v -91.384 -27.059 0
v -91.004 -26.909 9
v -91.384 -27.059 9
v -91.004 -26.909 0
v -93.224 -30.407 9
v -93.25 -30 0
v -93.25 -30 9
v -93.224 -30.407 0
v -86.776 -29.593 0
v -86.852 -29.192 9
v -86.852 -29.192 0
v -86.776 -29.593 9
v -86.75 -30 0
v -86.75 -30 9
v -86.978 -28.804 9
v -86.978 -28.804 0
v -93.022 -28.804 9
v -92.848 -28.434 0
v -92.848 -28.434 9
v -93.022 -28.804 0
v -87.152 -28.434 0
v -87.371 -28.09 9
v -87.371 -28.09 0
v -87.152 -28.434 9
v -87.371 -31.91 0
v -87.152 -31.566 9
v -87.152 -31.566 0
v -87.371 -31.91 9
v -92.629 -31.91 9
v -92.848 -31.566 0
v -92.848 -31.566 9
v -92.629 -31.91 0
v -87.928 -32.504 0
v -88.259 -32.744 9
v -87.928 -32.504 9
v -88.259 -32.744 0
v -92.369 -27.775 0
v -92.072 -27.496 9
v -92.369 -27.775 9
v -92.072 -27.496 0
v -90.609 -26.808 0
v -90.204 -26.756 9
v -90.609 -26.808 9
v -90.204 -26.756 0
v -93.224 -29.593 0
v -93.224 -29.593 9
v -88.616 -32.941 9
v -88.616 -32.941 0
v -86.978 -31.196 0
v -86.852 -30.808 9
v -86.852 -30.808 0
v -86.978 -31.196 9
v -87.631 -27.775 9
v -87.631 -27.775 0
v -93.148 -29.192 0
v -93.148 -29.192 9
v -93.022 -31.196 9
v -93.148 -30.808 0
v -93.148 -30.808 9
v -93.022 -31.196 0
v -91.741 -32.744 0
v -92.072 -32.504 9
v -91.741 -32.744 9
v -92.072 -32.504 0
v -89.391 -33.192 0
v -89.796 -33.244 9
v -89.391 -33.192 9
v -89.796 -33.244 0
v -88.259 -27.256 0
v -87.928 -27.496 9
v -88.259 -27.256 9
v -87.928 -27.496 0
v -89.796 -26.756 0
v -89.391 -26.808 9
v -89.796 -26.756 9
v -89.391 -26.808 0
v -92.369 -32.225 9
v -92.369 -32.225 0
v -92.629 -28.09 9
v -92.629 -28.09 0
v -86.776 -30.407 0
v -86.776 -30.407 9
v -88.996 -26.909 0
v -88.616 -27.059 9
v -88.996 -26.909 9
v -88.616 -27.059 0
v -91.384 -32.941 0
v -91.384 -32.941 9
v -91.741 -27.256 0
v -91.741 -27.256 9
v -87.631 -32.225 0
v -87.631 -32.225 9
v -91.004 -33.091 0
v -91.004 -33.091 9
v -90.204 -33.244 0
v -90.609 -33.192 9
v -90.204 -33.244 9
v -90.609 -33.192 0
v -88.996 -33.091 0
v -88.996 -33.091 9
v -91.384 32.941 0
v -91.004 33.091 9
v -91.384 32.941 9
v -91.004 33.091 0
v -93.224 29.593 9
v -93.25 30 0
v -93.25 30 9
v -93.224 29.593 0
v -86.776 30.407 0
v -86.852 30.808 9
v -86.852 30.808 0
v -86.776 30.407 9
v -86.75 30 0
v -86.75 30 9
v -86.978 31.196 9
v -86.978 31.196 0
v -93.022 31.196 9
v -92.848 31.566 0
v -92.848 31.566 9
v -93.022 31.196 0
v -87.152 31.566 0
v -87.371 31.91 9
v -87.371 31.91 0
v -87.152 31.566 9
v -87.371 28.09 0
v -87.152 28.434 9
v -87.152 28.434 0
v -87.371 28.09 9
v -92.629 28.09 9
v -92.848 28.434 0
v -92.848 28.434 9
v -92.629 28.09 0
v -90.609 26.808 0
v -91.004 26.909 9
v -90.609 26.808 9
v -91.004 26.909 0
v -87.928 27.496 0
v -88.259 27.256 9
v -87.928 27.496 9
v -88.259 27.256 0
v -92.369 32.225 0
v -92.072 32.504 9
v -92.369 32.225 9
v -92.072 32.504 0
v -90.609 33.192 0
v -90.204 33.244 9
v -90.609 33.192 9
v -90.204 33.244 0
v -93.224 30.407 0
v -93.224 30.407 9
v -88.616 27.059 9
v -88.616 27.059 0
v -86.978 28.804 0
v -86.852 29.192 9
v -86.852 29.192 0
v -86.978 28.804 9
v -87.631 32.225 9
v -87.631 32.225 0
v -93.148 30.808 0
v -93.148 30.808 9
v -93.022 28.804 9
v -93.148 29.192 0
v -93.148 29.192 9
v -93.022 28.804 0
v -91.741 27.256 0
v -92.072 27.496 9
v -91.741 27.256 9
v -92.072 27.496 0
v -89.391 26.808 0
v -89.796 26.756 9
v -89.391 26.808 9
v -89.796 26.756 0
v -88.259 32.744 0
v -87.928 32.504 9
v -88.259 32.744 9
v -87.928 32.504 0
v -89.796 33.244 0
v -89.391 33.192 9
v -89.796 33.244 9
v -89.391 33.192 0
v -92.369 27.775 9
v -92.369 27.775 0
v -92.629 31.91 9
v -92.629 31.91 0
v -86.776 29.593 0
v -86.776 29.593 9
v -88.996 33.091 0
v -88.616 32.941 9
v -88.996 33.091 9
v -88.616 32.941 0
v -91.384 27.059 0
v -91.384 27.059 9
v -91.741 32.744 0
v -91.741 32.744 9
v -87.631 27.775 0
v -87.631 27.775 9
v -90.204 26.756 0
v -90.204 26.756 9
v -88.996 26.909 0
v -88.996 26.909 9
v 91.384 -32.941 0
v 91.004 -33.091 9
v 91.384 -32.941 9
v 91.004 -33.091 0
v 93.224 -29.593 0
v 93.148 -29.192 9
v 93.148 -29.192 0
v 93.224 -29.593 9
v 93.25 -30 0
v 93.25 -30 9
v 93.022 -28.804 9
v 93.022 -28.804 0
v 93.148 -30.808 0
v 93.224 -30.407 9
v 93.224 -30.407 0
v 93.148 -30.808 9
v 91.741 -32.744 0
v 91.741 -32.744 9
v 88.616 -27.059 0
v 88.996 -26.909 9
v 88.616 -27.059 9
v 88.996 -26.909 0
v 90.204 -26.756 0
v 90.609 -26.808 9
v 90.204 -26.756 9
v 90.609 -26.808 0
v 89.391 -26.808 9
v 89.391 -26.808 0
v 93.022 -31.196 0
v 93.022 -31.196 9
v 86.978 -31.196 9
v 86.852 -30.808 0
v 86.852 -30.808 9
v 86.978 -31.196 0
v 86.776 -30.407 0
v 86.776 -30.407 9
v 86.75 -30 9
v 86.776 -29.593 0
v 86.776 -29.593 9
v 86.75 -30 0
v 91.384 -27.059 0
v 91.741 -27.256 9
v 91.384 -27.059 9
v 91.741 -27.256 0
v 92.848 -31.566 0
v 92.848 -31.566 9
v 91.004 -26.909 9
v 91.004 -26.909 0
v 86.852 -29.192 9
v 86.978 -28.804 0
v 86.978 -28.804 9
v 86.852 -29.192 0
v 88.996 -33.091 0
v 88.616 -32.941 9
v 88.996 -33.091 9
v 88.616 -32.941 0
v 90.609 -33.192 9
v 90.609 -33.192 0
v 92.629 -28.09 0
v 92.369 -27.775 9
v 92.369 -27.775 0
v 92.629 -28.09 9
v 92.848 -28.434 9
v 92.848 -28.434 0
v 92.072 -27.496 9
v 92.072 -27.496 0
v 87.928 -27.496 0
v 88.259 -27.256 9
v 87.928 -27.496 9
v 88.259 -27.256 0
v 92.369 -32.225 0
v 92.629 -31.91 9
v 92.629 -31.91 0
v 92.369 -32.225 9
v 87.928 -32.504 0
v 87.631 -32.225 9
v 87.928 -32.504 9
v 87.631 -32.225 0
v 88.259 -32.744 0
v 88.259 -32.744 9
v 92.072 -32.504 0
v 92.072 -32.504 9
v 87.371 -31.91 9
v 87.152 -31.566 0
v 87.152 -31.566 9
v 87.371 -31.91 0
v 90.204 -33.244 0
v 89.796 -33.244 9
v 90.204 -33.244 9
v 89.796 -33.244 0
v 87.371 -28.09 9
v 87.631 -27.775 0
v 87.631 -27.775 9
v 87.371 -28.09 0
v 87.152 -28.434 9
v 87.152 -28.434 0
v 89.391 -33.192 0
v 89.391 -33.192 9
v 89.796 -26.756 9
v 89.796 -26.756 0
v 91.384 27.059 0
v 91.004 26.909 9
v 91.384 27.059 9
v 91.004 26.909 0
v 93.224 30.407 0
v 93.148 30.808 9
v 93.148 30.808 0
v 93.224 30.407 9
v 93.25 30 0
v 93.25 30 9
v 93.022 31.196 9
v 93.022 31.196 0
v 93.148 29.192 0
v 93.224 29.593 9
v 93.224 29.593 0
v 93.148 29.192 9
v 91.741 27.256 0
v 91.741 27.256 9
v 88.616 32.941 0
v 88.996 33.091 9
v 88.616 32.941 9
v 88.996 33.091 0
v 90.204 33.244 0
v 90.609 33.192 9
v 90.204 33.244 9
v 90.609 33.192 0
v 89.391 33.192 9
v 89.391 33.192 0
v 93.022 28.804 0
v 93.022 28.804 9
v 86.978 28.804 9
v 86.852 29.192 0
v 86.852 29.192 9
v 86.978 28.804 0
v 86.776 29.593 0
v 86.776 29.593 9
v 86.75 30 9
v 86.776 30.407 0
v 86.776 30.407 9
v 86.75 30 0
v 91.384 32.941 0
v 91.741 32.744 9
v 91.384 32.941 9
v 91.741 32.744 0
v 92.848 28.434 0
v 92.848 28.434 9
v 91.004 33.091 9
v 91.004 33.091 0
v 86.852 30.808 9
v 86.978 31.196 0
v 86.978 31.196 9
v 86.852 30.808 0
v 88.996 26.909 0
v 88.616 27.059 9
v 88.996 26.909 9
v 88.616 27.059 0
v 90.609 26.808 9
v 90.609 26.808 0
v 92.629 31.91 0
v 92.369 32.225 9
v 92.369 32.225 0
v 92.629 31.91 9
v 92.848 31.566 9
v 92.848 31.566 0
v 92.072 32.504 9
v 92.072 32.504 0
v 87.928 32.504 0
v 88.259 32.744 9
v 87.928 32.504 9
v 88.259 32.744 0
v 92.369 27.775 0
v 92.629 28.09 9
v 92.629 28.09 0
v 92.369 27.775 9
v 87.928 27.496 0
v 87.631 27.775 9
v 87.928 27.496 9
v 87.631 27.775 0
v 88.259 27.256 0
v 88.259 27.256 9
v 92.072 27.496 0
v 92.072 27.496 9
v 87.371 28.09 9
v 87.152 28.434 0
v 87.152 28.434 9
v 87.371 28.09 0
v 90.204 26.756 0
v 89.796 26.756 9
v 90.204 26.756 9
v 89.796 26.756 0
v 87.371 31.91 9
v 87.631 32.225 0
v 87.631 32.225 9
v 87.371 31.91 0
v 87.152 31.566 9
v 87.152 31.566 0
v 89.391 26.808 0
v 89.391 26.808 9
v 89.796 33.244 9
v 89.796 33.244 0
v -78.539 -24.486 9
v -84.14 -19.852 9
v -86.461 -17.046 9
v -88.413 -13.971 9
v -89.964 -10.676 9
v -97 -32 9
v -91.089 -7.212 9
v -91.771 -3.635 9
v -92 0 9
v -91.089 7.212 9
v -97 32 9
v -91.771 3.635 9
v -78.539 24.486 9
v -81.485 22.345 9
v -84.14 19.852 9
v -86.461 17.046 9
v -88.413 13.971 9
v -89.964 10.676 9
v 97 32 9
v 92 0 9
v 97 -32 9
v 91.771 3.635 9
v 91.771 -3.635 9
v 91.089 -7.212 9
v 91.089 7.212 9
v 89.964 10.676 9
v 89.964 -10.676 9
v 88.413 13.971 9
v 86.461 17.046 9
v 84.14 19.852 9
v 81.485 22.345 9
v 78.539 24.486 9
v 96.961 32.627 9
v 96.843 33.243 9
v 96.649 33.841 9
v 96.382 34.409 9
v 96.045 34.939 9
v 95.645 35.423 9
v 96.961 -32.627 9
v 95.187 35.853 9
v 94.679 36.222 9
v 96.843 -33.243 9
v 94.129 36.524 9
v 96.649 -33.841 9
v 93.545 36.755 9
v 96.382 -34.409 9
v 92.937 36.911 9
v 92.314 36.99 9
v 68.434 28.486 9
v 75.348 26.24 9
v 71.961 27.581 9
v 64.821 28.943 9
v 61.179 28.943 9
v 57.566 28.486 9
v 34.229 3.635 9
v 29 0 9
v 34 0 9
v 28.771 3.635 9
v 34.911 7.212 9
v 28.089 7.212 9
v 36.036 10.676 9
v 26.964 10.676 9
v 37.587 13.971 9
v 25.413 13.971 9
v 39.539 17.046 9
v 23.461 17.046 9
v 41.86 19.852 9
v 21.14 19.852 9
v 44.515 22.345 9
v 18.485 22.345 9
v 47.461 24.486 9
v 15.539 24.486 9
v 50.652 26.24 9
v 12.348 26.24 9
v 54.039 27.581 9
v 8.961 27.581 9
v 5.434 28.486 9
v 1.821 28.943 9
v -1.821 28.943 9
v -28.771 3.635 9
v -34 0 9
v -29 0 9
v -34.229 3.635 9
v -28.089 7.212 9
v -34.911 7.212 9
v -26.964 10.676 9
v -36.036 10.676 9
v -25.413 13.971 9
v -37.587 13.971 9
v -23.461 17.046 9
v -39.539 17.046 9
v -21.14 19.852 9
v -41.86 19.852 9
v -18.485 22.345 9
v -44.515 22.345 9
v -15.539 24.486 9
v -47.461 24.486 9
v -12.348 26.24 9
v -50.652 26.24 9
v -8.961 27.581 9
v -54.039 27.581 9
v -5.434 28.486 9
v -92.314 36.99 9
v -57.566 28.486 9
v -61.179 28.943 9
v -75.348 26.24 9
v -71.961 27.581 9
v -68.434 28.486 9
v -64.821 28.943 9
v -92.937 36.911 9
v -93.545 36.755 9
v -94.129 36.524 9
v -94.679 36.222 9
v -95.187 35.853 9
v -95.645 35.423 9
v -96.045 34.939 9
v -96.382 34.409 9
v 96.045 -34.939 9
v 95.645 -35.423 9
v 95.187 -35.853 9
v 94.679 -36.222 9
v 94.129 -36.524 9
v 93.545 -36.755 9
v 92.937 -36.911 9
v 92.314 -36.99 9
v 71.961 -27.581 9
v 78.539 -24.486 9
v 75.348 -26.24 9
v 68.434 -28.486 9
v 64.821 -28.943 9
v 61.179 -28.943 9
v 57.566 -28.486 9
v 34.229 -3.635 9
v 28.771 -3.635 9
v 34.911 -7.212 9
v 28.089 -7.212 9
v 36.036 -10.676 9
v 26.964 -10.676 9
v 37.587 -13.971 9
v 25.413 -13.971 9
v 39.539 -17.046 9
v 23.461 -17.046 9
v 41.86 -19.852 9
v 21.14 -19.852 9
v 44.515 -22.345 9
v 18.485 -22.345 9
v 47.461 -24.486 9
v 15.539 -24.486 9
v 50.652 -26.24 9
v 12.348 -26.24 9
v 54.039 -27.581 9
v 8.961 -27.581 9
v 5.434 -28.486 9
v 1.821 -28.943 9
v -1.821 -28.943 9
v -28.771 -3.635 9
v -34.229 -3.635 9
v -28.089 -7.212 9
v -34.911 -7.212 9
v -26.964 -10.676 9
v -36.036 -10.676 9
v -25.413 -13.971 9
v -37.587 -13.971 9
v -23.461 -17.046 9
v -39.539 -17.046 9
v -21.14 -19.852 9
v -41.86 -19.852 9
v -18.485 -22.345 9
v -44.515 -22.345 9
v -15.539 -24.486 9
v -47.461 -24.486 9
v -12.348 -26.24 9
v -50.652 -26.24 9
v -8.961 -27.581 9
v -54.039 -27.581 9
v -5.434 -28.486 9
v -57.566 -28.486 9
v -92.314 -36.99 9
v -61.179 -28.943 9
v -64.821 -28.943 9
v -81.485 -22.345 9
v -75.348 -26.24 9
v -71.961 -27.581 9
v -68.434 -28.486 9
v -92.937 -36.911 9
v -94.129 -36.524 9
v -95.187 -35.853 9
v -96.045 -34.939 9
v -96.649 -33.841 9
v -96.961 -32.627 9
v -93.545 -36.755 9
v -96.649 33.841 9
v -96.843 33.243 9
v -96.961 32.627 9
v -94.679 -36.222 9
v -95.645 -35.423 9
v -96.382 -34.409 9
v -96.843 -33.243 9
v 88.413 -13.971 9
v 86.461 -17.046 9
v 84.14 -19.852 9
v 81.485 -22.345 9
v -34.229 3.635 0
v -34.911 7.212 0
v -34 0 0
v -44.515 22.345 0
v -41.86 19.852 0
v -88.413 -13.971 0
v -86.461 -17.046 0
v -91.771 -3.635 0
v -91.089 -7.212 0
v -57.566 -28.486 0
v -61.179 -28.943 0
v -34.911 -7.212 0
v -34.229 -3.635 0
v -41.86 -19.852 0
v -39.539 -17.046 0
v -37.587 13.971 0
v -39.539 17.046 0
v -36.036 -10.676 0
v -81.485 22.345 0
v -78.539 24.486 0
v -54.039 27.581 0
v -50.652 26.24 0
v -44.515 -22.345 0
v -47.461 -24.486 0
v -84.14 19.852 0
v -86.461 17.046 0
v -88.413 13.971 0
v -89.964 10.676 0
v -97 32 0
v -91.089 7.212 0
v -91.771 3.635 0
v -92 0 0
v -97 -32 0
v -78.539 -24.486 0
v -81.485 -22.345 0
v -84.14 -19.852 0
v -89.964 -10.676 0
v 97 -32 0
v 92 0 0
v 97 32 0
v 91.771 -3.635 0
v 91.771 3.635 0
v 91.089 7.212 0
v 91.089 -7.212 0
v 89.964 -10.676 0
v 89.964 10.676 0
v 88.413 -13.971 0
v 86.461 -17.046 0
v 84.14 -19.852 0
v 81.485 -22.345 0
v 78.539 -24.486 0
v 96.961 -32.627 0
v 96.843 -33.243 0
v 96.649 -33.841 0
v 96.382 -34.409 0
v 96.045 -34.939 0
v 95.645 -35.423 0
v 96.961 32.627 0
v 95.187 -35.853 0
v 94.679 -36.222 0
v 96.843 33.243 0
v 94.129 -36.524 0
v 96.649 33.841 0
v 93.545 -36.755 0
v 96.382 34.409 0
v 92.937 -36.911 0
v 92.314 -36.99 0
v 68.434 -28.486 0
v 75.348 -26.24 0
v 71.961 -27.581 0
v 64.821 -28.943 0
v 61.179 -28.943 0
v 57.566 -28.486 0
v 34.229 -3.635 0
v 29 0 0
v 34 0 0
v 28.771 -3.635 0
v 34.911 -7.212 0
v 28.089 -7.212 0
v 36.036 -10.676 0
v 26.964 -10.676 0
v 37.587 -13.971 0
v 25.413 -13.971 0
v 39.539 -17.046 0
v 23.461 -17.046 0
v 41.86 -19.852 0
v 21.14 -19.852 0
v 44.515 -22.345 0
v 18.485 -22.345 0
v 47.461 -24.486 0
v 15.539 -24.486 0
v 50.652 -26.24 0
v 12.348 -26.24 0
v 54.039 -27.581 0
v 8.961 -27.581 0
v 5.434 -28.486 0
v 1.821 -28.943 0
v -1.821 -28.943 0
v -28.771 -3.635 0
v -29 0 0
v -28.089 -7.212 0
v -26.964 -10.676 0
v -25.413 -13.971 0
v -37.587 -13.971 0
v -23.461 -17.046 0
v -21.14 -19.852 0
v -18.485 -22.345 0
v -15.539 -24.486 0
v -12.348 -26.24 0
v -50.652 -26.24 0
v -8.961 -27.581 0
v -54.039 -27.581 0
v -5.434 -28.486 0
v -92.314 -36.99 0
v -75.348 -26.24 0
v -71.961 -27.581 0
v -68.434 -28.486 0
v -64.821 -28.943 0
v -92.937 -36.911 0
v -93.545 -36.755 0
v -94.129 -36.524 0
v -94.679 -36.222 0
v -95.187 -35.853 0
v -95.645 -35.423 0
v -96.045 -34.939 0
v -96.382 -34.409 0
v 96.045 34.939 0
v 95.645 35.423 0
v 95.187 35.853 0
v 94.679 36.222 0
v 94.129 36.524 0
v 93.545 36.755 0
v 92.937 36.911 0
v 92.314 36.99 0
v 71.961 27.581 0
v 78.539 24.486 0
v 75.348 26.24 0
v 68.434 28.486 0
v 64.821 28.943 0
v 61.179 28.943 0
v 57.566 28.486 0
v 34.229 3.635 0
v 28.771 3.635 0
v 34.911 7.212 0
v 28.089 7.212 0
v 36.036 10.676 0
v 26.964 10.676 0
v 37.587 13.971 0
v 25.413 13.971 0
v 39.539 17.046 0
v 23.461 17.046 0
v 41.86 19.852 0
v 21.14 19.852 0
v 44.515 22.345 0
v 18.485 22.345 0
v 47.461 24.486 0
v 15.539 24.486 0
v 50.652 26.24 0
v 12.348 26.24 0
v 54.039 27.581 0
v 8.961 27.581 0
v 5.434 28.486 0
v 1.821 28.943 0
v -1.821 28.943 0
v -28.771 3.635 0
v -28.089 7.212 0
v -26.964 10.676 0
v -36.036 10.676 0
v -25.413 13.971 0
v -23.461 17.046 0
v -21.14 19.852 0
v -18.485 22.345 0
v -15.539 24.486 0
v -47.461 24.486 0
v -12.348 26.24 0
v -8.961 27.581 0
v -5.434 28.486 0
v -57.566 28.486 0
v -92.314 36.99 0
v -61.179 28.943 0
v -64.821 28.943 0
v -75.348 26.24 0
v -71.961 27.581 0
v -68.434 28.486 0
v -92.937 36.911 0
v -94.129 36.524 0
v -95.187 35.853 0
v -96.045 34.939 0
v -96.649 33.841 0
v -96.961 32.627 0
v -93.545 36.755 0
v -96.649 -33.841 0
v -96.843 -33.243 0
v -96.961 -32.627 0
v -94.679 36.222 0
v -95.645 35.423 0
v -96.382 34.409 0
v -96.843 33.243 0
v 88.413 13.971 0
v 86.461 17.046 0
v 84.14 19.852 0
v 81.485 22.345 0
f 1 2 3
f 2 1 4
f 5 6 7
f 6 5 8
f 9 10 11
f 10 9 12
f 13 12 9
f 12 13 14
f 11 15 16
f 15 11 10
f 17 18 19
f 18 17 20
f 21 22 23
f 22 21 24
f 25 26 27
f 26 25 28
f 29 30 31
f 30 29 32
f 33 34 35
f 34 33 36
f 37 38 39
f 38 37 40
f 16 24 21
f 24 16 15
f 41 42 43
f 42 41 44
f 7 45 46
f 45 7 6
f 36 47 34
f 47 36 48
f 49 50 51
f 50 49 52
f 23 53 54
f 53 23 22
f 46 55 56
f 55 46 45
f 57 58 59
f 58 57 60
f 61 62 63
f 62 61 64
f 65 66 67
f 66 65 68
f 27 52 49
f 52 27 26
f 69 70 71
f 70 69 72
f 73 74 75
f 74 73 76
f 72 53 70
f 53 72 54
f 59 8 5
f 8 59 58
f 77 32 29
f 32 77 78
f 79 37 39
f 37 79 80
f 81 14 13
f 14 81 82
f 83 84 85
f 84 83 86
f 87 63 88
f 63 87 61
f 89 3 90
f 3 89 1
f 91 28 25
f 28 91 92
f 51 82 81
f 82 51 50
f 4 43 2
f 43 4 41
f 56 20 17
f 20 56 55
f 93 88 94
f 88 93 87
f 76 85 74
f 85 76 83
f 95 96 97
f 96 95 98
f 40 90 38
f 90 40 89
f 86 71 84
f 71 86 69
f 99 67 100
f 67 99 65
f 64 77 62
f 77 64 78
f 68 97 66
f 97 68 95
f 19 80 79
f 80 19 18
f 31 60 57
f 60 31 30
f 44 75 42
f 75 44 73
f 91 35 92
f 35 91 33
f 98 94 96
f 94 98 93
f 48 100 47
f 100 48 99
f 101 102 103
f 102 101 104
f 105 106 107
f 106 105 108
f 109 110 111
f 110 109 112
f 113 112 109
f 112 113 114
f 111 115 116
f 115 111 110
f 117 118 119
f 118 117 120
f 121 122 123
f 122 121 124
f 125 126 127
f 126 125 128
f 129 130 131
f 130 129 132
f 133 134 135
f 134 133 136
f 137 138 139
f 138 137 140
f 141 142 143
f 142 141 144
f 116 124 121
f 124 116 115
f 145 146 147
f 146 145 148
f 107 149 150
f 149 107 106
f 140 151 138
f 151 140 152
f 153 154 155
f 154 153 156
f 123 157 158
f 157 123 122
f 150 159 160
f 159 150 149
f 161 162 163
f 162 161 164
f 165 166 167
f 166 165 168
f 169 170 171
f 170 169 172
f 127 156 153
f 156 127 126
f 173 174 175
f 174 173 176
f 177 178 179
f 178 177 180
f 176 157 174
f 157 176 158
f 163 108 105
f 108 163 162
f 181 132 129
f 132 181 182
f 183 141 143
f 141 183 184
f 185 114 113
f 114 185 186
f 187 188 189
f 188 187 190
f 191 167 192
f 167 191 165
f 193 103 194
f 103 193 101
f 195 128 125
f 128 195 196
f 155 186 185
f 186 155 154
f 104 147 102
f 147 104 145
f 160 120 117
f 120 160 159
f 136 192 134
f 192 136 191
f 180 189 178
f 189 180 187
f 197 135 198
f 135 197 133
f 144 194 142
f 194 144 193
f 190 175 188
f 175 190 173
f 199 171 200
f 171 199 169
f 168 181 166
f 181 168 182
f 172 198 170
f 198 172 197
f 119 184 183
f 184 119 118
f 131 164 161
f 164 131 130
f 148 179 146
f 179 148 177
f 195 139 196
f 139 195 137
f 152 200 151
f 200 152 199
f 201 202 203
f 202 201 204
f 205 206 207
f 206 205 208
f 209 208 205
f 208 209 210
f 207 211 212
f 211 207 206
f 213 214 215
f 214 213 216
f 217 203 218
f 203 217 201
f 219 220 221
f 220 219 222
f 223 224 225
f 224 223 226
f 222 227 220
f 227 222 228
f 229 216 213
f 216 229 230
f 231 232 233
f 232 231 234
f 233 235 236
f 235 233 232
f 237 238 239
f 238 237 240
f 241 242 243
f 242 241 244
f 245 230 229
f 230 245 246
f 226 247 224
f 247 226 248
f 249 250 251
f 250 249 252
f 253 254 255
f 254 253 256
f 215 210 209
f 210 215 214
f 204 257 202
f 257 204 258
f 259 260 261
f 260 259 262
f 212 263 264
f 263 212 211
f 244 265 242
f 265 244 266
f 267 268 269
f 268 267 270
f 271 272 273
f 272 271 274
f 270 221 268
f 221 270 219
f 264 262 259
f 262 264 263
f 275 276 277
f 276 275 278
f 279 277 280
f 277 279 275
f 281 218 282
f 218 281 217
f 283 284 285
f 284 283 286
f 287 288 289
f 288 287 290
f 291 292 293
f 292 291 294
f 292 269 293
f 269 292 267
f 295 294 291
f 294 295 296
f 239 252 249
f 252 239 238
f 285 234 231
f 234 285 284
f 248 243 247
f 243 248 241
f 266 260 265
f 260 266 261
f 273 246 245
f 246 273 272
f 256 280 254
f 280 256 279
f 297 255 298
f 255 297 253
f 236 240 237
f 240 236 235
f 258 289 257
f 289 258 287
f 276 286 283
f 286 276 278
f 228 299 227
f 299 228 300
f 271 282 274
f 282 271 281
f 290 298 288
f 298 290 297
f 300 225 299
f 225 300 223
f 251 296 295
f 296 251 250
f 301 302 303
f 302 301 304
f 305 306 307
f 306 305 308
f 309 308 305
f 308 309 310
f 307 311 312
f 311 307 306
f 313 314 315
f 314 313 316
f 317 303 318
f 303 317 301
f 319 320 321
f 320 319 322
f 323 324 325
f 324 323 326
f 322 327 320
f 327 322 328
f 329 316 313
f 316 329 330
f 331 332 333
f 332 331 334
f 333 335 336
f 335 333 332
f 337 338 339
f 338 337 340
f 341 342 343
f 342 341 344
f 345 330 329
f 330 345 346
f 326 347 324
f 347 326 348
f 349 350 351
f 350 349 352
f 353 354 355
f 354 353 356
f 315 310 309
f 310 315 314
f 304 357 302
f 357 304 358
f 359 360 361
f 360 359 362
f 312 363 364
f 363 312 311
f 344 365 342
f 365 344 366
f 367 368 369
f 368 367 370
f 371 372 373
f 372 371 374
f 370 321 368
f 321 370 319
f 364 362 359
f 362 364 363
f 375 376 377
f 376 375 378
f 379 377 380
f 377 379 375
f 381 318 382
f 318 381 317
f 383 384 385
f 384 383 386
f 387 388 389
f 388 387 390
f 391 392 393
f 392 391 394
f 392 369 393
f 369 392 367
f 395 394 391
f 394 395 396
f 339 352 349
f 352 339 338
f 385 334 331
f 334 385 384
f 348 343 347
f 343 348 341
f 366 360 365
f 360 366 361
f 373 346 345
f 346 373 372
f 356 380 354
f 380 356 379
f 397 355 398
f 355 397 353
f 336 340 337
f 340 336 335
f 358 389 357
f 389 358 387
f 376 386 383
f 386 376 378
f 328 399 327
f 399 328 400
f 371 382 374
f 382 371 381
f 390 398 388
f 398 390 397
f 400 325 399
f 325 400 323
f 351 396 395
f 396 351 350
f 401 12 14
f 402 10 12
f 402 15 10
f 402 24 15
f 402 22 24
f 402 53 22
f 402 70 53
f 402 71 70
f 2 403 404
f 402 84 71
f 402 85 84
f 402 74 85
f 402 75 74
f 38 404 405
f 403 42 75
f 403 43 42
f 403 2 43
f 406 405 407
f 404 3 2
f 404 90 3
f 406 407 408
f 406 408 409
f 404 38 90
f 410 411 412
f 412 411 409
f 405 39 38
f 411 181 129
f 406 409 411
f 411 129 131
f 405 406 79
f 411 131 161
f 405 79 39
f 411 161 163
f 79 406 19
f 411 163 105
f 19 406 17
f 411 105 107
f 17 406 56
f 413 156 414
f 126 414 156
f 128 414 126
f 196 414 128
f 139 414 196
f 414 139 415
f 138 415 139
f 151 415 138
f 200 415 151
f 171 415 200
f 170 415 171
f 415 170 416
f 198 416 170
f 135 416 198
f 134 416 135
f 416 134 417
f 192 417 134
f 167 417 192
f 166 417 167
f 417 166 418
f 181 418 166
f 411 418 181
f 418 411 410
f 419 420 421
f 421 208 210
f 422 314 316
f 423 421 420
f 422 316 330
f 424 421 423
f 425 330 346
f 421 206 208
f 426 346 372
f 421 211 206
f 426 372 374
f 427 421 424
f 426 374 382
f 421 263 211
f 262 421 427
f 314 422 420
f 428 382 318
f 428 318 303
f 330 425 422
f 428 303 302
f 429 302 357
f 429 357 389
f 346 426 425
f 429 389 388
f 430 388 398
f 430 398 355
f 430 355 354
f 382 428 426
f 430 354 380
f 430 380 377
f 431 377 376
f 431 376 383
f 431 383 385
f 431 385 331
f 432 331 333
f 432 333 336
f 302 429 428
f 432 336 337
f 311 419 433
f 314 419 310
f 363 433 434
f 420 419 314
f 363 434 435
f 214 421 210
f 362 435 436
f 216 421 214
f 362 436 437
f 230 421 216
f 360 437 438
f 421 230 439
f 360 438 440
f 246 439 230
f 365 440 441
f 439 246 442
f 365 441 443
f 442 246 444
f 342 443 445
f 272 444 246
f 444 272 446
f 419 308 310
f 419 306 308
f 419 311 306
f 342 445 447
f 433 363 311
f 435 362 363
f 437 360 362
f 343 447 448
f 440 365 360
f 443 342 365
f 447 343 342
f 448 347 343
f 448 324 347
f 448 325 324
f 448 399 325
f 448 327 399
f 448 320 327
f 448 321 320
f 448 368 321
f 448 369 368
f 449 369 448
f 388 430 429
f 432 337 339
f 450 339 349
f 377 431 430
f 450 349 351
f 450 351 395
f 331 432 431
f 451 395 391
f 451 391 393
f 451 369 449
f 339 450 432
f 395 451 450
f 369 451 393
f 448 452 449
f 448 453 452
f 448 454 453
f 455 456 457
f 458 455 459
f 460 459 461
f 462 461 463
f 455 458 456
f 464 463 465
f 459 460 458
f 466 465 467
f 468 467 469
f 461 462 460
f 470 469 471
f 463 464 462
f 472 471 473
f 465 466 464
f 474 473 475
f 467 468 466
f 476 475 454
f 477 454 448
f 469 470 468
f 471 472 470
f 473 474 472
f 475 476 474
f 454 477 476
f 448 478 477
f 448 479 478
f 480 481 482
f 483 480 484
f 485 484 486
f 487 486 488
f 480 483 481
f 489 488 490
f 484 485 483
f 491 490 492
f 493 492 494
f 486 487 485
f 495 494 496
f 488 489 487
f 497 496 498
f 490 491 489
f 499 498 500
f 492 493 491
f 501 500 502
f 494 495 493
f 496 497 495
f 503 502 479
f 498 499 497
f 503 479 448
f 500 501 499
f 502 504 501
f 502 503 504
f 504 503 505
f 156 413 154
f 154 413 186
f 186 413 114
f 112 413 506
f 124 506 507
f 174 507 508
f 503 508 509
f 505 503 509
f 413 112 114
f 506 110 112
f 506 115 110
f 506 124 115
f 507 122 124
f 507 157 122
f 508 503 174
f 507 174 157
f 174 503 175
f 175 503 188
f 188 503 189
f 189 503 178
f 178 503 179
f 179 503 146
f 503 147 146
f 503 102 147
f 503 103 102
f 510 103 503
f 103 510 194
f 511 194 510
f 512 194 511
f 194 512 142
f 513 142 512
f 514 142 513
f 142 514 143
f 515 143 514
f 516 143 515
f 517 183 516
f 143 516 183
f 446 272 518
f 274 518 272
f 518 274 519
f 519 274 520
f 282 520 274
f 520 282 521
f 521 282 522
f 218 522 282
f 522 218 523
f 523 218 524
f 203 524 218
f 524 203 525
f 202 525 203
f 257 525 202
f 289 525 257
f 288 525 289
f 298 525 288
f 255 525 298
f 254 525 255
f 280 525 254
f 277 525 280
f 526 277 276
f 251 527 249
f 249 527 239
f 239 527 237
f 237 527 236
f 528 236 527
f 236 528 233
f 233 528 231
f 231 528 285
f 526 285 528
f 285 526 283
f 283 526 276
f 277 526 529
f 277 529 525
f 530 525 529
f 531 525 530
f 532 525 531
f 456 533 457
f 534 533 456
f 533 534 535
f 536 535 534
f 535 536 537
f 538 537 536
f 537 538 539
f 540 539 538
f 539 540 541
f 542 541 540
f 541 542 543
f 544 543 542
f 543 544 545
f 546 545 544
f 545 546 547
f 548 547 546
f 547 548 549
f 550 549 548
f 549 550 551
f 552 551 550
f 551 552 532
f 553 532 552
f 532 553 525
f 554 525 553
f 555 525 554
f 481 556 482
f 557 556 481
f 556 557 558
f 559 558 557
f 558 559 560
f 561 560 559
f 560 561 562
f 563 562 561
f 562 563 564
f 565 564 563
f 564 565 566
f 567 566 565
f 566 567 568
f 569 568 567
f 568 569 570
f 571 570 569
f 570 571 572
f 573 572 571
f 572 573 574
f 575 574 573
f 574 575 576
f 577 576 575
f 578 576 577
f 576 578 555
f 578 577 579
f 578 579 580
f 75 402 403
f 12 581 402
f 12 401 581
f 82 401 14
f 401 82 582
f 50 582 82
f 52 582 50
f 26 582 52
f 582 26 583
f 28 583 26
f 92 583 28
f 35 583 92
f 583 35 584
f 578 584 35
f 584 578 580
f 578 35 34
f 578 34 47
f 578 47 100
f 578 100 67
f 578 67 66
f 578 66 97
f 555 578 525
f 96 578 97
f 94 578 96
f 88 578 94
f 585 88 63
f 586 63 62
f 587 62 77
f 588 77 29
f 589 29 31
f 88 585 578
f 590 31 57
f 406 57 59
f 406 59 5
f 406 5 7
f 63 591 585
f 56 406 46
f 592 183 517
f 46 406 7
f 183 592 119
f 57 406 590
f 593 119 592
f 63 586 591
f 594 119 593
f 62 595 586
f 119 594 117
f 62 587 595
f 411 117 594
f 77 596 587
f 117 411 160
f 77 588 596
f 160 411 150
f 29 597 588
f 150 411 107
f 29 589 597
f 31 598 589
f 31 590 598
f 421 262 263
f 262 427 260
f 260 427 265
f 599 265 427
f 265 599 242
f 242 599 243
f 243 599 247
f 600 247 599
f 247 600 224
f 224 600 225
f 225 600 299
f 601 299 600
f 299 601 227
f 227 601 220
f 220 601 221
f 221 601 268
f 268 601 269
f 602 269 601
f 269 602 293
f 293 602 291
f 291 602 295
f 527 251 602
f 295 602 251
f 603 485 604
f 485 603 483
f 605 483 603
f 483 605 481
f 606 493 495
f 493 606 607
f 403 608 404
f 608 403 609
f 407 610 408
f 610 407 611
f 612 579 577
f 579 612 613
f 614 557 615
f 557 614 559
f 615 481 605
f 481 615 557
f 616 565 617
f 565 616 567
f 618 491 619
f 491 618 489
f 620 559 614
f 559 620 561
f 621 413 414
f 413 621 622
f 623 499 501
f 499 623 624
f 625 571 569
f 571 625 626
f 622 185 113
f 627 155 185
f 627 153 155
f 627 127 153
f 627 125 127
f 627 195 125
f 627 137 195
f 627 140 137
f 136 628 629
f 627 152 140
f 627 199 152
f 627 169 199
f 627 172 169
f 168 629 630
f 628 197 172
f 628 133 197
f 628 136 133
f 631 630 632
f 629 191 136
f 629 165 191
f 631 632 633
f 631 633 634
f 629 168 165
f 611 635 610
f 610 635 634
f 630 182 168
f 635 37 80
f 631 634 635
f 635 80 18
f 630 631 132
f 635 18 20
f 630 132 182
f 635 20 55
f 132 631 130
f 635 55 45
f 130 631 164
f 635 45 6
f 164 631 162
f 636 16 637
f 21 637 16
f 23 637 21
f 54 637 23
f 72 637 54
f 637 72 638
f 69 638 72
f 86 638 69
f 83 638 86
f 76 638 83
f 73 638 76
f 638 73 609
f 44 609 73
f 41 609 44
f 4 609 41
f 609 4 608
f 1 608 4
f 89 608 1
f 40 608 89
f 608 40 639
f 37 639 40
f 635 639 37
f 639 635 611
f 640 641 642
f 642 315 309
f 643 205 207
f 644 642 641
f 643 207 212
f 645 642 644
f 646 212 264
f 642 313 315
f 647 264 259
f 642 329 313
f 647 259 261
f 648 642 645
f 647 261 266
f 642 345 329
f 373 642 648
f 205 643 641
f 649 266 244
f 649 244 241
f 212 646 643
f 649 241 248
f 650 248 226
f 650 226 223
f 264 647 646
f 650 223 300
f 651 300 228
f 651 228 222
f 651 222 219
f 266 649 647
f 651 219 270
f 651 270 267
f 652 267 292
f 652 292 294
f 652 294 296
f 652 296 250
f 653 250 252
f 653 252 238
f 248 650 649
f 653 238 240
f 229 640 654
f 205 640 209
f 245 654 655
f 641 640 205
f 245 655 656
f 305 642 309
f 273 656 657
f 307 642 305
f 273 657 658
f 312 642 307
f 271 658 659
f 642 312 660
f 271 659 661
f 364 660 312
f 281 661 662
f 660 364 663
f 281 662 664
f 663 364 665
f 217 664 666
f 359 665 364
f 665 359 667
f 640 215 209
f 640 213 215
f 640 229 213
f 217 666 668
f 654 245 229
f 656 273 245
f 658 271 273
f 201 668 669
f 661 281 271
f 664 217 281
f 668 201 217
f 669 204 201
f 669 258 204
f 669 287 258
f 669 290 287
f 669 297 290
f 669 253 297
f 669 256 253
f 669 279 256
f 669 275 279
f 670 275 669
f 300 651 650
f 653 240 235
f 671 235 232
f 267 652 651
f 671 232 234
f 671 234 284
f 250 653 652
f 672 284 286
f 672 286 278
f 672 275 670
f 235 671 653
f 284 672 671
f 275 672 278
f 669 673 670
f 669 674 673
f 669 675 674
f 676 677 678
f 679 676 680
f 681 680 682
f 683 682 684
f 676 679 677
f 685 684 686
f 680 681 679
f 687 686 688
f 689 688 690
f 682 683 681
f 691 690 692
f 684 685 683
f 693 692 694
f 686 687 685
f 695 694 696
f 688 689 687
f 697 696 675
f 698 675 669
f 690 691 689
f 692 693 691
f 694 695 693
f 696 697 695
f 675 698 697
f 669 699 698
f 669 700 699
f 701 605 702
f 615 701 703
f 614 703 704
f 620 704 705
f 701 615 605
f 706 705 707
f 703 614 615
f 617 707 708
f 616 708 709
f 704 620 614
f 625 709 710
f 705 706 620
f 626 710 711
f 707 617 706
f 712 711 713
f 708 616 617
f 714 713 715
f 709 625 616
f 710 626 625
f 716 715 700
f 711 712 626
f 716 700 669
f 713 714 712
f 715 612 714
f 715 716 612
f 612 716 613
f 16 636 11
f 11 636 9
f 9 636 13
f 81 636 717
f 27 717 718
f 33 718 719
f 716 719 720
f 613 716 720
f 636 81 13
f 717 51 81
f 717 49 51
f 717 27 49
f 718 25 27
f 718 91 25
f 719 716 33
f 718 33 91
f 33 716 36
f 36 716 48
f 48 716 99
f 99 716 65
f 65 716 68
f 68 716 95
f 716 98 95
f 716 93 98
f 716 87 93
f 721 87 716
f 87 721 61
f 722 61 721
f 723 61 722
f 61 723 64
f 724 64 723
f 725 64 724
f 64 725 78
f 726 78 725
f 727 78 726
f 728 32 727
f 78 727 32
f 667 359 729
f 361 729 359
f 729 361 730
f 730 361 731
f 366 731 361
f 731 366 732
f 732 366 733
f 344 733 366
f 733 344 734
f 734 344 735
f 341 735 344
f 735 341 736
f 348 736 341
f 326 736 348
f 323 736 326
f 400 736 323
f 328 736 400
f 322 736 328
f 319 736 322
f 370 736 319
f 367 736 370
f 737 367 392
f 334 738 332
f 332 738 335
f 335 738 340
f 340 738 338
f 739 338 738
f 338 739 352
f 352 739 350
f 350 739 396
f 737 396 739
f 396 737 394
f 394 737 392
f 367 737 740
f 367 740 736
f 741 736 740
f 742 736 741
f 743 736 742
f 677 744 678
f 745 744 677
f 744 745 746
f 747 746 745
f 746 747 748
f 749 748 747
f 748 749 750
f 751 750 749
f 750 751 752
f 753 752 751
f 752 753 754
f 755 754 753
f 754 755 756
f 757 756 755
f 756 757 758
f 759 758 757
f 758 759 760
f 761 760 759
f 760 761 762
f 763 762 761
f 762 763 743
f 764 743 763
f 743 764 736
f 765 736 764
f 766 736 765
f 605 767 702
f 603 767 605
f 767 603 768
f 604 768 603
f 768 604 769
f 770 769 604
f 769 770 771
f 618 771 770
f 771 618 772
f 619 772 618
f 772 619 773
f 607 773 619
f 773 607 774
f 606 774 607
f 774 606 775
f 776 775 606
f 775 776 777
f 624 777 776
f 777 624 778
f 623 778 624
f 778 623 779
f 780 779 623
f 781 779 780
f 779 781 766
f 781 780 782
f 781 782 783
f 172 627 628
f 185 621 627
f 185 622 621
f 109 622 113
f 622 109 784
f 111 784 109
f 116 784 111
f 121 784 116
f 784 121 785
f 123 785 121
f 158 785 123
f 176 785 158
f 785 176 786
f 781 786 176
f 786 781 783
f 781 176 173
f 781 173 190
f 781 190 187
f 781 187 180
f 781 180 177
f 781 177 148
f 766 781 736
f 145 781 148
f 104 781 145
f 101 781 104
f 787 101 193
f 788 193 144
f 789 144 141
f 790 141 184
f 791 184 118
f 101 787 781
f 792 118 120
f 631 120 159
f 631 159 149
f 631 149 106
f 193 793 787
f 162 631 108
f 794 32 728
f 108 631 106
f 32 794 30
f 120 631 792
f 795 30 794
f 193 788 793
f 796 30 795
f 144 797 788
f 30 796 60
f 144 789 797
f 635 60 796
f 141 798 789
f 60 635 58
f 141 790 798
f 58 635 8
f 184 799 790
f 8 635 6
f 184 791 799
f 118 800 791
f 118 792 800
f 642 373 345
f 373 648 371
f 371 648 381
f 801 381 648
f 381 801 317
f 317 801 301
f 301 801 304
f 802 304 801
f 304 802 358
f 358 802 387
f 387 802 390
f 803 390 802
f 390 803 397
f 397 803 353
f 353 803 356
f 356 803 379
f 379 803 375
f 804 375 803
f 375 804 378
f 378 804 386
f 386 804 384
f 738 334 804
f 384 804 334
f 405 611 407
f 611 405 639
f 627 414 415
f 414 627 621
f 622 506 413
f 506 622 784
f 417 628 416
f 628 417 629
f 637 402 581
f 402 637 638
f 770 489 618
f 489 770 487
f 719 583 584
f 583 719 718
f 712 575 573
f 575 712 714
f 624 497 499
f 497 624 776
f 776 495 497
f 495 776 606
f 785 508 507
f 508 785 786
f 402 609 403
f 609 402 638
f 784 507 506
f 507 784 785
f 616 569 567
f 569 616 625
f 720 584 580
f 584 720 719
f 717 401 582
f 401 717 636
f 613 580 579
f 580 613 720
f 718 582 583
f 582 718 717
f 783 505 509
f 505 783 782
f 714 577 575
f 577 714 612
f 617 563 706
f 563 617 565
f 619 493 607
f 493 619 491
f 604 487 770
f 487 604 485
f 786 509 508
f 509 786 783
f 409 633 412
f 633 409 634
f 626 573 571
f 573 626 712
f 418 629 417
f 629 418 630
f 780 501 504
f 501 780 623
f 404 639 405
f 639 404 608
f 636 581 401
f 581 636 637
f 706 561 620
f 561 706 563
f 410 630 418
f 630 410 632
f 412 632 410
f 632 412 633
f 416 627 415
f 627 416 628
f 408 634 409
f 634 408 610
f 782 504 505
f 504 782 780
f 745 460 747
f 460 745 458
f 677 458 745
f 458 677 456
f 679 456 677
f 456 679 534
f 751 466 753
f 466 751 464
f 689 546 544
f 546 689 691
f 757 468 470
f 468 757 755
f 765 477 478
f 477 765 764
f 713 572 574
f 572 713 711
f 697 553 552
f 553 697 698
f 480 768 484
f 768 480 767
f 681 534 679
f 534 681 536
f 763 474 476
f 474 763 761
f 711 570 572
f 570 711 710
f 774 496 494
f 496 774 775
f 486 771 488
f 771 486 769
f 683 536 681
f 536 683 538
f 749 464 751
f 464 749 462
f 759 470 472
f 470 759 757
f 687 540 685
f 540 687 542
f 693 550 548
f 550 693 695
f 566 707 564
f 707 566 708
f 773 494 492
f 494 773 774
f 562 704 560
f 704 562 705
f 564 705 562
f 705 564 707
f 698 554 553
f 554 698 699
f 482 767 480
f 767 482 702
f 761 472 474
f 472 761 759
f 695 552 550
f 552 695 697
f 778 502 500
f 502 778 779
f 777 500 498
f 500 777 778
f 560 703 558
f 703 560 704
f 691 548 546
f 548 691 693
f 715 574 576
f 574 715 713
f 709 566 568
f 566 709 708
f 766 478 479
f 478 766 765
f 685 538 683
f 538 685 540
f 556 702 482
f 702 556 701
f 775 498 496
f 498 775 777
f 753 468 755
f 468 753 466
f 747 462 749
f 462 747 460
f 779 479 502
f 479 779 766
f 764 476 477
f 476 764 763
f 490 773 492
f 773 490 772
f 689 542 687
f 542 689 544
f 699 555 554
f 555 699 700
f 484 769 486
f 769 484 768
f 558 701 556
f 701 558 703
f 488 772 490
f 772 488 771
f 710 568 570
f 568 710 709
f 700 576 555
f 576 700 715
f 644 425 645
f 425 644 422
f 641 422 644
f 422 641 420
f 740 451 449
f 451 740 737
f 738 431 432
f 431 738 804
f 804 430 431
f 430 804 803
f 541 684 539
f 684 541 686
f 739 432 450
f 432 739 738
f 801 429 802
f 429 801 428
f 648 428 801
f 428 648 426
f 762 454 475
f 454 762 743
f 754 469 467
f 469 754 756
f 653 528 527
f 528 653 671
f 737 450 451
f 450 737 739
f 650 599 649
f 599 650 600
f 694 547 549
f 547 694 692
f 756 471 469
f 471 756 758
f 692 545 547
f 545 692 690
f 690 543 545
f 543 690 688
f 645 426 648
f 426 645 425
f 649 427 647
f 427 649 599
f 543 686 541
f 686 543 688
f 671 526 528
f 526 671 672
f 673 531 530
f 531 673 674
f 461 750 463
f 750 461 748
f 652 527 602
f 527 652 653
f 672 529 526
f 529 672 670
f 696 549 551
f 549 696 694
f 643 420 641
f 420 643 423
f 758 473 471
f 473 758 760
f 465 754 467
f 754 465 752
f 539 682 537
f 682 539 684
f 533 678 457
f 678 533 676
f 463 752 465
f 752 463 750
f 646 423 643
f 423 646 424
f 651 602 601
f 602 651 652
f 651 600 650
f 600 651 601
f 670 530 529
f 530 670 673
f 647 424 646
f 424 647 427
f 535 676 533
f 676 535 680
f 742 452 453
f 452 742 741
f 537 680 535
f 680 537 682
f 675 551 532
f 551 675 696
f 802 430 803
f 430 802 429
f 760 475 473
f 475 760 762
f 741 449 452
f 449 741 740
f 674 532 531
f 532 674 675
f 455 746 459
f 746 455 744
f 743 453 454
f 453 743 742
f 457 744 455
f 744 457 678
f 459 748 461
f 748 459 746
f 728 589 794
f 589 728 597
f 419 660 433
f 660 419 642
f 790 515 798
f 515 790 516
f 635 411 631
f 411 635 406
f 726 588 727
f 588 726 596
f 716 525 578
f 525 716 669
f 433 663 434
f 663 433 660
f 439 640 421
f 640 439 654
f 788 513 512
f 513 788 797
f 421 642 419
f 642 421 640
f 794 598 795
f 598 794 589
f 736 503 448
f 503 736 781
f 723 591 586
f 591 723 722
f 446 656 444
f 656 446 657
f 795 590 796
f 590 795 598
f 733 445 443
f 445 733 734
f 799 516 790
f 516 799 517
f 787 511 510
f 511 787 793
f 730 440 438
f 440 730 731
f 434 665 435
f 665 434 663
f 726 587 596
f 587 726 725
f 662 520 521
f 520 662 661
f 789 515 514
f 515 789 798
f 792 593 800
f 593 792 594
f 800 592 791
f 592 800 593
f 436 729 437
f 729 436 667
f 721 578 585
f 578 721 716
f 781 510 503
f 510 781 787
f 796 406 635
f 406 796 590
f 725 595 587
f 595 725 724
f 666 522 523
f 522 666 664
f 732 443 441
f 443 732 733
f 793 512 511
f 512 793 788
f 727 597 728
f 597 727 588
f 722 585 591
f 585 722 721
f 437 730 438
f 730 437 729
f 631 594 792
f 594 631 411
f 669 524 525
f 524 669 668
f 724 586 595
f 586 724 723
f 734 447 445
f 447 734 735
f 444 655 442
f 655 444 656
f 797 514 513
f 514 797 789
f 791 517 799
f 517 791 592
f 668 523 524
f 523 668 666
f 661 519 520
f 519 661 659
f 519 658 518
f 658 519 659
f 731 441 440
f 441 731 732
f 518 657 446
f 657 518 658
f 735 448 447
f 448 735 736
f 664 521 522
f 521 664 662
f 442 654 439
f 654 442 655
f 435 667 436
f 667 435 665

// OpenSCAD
$fn = 50;

difference() {
	union() {
		hull() {
			translate(v = [-92.0, 32.0, 0]) {
				cylinder(h = 9, r = 5);
			}
			translate(v = [92.0, 32.0, 0]) {
				cylinder(h = 9, r = 5);
			}
			translate(v = [-92.0, -32.0, 0]) {
				cylinder(h = 9, r = 5);
			}
			translate(v = [92.0, -32.0, 0]) {
				cylinder(h = 9, r = 5);
			}
		}
	}
	union() {
		translate(v = [-90.0, -30.0, -100.0]) {
			cylinder(h = 200, r = 3.25);
		}
		translate(v = [-90.0, 30.0, -100.0]) {
			cylinder(h = 200, r = 3.25);
		}
		translate(v = [90.0, -30.0, -100.0]) {
			cylinder(h = 200, r = 3.25);
		}
		translate(v = [90.0, 30.0, -100.0]) {
			cylinder(h = 200, r = 3.25);
		}
		translate(v = [-90.0, -30.0, -100.0]) {
			cylinder(h = 200, r = 1.8);
		}
		translate(v = [-90.0, 30.0, -100.0]) {
			cylinder(h = 200, r = 1.8);
		}
		translate(v = [90.0, -30.0, -100.0]) {
			cylinder(h = 200, r = 1.8);
		}
		translate(v = [90.0, 30.0, -100.0]) {
			cylinder(h = 200, r = 1.8);
		}
		translate(v = [-63.0, 0, 0.0]) {
			cylinder(h = 9, r = 29.0);
		}
		cylinder(h = 9, r = 29.0);
		translate(v = [63.0, 0, 0.0]) {
			cylinder(h = 9, r = 29.0);
		}
	}
}
